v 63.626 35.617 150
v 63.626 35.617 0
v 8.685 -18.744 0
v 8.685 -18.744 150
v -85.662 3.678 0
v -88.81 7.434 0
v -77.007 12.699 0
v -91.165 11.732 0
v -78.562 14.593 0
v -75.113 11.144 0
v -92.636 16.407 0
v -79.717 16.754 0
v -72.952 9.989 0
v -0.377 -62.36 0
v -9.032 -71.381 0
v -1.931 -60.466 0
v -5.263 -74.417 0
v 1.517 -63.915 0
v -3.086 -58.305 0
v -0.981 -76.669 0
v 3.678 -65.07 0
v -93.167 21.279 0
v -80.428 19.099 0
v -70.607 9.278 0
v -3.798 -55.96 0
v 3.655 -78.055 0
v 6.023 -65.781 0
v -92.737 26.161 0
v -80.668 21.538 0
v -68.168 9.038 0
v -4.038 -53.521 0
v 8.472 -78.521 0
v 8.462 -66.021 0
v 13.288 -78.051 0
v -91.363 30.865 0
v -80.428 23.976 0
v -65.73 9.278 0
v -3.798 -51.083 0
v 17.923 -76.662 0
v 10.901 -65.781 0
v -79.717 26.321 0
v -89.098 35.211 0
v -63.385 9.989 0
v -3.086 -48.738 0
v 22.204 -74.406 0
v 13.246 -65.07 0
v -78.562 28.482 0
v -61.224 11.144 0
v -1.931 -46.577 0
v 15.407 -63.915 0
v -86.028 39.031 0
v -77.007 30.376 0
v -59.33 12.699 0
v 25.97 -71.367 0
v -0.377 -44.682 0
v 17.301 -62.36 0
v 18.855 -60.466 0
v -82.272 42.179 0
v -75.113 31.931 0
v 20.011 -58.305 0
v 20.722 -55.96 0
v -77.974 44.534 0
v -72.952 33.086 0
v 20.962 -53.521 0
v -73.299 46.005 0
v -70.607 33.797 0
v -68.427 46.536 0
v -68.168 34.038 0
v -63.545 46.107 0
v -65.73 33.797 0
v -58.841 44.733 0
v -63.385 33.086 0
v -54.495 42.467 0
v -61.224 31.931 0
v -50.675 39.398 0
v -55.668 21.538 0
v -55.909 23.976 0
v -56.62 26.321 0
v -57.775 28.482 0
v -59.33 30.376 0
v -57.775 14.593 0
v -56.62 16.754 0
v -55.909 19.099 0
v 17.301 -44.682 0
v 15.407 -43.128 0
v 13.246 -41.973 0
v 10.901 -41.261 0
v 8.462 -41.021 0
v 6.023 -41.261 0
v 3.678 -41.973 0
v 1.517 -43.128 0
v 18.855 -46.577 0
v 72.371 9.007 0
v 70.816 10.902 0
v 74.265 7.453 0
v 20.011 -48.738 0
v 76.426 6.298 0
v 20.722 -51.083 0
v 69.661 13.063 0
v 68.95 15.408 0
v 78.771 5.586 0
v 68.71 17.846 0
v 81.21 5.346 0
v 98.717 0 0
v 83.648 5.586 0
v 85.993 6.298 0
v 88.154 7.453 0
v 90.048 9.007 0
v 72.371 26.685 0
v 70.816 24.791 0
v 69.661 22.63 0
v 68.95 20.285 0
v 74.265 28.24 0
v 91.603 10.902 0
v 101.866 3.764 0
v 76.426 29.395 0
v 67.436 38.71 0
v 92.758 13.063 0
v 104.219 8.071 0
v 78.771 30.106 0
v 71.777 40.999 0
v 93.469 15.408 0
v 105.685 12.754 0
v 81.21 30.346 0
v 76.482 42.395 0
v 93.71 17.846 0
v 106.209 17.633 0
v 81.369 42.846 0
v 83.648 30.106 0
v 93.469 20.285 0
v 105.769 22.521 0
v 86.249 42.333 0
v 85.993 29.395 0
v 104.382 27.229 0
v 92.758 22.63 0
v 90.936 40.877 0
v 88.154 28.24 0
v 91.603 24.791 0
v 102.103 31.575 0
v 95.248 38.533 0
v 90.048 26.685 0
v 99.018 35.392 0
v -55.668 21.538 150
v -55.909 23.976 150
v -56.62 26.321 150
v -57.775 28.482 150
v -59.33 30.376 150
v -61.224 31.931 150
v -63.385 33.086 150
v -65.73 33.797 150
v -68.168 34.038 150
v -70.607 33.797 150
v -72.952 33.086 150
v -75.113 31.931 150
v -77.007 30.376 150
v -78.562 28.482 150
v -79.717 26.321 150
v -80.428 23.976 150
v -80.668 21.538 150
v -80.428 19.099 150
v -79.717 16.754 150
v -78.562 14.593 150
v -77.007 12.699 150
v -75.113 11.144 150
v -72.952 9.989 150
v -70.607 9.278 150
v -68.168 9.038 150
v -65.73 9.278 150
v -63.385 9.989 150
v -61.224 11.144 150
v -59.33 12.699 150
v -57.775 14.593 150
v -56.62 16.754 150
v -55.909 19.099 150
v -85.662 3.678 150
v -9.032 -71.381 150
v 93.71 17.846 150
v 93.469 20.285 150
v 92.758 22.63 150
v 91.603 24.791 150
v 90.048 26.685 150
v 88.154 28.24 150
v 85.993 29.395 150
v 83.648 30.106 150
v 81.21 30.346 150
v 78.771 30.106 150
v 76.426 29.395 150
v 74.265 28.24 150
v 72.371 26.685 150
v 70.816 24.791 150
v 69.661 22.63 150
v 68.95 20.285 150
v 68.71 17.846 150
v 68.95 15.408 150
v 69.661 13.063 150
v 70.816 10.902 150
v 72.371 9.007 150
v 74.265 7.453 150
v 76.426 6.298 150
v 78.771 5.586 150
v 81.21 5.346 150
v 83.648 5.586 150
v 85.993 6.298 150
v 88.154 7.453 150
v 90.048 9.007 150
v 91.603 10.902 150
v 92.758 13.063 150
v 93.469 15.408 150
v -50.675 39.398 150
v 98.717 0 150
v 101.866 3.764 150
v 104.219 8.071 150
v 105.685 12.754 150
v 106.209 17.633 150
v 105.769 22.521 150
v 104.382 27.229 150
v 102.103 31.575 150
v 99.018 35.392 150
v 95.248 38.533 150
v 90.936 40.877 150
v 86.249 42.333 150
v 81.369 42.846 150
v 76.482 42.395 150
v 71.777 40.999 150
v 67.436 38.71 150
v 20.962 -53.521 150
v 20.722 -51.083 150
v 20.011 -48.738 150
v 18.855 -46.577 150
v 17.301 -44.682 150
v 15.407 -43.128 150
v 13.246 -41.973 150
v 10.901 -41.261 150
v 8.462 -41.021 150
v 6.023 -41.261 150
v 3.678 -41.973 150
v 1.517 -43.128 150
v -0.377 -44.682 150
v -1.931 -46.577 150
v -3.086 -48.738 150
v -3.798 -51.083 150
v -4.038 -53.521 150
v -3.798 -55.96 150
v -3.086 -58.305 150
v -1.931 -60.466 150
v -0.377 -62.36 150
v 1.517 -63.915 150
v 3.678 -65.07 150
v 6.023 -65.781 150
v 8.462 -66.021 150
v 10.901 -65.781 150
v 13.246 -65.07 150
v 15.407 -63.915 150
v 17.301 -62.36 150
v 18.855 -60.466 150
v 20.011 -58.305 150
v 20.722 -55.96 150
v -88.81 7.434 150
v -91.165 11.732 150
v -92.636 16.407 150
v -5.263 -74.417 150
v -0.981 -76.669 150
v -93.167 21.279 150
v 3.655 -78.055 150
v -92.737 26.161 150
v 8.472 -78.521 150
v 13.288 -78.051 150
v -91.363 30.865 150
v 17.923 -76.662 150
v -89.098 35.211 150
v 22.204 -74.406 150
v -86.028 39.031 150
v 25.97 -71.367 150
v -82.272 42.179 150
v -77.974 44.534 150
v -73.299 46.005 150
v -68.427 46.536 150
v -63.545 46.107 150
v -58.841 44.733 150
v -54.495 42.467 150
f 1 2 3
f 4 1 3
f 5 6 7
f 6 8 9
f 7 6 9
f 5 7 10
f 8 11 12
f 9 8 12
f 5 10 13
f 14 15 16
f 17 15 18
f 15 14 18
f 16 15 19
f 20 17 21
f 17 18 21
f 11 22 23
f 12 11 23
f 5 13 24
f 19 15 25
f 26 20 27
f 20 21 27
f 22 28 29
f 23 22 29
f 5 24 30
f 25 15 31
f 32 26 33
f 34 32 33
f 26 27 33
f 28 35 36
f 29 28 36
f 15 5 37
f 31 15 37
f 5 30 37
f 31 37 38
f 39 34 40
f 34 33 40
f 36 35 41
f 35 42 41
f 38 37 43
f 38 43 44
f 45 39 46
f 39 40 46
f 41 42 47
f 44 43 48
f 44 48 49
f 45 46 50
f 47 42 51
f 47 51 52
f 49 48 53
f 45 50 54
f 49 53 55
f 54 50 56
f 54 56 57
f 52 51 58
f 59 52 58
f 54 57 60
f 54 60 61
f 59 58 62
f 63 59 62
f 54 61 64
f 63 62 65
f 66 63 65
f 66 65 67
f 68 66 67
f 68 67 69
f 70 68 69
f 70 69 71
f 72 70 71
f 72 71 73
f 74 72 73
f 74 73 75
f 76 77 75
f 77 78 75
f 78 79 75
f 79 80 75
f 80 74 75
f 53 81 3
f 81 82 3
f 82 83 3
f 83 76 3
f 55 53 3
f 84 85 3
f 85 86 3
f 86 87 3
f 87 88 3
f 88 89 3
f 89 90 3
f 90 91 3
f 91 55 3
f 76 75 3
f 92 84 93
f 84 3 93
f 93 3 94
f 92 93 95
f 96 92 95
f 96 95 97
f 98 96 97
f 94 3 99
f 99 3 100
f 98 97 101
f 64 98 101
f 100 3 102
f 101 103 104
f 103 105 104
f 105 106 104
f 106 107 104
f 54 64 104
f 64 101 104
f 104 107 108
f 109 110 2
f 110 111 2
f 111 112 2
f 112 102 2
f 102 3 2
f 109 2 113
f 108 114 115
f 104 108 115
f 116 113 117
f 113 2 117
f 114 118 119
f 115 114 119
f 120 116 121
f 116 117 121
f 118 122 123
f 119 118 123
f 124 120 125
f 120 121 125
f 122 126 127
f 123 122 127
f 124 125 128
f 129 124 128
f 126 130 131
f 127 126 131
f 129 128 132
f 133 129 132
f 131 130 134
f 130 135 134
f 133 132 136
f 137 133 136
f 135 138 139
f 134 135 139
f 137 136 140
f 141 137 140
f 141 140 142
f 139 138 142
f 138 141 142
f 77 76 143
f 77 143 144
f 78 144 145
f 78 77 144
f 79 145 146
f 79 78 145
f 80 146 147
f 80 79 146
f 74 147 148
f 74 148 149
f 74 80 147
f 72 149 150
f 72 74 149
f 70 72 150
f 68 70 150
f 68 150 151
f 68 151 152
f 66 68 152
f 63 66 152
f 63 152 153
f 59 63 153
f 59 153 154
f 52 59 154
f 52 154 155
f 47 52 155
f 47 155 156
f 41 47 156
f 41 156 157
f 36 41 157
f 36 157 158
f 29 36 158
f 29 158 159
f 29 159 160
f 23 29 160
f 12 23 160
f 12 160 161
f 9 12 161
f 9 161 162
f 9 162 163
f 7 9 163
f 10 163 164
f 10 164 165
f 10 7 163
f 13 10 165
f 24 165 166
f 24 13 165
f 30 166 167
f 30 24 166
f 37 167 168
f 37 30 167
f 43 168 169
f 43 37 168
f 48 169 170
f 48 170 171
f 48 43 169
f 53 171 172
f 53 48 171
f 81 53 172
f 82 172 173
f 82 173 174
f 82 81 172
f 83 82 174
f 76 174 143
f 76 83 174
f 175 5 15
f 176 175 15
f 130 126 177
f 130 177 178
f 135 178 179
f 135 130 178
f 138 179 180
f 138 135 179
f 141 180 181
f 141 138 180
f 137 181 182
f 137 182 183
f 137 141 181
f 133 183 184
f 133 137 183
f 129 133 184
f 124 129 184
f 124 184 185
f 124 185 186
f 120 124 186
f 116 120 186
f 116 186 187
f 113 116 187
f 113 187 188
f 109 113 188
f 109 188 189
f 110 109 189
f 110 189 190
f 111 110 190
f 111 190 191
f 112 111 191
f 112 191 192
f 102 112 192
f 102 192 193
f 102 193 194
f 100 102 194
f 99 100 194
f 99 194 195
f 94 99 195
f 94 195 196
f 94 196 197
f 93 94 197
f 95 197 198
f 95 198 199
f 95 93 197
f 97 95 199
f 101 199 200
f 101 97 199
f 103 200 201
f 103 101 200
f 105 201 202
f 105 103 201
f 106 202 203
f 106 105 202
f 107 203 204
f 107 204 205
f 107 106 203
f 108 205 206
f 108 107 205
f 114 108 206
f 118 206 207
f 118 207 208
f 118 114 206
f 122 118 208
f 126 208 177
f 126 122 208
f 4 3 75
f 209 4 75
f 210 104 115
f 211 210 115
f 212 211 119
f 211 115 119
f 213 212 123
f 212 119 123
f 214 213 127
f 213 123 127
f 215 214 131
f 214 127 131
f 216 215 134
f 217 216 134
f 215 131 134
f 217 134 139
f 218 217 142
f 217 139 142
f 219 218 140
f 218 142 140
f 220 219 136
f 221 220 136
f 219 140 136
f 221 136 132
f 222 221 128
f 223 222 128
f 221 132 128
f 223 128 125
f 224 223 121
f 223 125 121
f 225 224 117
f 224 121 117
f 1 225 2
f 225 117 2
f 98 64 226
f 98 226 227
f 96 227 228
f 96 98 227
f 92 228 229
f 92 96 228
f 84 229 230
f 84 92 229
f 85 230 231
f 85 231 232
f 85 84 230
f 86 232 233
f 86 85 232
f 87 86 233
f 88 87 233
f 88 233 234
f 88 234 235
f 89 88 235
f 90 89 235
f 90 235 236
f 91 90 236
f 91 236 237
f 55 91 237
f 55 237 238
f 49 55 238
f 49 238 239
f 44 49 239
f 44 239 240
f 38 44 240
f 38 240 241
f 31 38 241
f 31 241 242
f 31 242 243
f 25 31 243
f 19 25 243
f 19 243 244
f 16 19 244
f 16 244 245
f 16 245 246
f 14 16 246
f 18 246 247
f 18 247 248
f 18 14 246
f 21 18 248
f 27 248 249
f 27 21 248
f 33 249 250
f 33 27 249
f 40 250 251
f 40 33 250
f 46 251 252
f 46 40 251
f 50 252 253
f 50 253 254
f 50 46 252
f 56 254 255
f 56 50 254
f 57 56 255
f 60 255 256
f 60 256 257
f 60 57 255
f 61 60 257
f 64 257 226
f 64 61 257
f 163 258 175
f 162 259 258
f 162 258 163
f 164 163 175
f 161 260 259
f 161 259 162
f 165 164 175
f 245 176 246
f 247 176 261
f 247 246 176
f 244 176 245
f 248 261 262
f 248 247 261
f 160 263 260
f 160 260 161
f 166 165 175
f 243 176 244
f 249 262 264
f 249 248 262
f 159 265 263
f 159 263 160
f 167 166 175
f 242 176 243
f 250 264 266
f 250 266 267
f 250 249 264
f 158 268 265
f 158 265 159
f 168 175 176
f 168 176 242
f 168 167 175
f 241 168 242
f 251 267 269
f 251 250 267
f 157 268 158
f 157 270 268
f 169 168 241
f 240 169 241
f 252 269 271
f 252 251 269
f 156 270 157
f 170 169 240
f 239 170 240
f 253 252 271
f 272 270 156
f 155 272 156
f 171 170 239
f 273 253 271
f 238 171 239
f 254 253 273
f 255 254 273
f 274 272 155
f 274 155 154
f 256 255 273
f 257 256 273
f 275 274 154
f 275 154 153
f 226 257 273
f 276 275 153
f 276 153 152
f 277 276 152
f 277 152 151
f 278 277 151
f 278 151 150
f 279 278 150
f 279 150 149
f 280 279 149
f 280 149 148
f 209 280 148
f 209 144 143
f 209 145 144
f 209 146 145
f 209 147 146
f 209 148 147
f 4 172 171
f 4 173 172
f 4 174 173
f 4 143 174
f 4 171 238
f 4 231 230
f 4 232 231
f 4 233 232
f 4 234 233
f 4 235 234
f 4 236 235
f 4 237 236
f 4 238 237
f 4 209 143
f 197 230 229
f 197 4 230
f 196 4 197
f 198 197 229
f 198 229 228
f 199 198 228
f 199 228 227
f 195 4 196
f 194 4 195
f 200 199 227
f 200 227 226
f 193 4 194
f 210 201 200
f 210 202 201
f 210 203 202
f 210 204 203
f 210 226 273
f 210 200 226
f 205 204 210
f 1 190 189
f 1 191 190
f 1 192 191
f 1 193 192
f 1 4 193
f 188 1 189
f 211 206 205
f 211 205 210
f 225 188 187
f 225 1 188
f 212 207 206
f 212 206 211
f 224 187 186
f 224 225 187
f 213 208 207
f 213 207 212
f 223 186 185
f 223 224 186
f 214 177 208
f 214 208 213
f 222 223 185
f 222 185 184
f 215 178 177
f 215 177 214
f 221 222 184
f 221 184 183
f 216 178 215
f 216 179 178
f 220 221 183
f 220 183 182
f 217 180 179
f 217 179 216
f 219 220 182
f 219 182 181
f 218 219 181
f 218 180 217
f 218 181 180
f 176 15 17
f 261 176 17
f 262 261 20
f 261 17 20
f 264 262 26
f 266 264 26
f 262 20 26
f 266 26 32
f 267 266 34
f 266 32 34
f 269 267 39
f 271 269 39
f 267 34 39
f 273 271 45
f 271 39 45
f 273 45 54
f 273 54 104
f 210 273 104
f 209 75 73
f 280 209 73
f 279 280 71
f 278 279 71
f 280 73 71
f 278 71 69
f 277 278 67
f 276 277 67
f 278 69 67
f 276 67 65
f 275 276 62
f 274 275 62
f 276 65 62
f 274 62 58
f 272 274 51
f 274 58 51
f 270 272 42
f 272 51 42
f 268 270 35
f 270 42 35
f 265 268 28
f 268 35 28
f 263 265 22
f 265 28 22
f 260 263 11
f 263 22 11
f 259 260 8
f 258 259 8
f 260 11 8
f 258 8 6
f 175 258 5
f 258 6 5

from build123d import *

# Parameters (mm, degrees)
F0_R     = 12.5
F1_DEPTH = 150
F3_DEPTH = 50


# Not quite as in the source:
# - the program builds the solid bodies; features that only make, move or delete a surface that nothing else refers to are left out


with BuildPart() as f1:
    # F0 (on Top) → F1 (new body)
    with BuildSketch(Plane.XY):
        with BuildLine():
            Line((8.6845052377, -18.7444362128), (-50.6748429861, 39.3975202147))
            ThreePointArc((-50.6748429861, 39.3975202147), (-86.0282846169, 39.0312350068), (-85.661999409, 3.6777933759))
            Line((-85.661999409, 3.6777933759), (-9.0315715293, -71.3810327757))
            ThreePointArc((-9.0315715293, -71.3810327757), (8.4718011348, -78.5211674377), (25.9695737293, -71.3673200922))
            Line((25.9695737293, -71.3673200922), (98.7170861934, 0))
            ThreePointArc((98.7170861934, 0), (99.0182133881, 35.3918171352), (63.6258335307, 35.6173071466))
            Line((63.6258335307, 35.6173071466), (8.6845052377, -18.7444362128))
        make_face()
        with Locations((8.4620066821, -53.5211693563)):
            Circle(F0_R, mode=Mode.SUBTRACT)
        with Locations((-68.1684211975, 21.5376567953)):
            Circle(F0_R, mode=Mode.SUBTRACT)
        with Locations((81.2095191462, 17.8461507359)):
            Circle(F0_R, mode=Mode.SUBTRACT)
    extrude(amount=F1_DEPTH)

    # F0 (on Top) → F3 (join)
    with BuildSketch(Plane.XY):
        with BuildLine():
            Line((8.6845052377, -18.7444362128), (-50.6748429861, 39.3975202147))
            ThreePointArc((-50.6748429861, 39.3975202147), (-86.0282846169, 39.0312350068), (-85.661999409, 3.6777933759))
            Line((-85.661999409, 3.6777933759), (-9.0315715293, -71.3810327757))
            ThreePointArc((-9.0315715293, -71.3810327757), (8.4718011348, -78.5211674377), (25.9695737293, -71.3673200922))
            Line((25.9695737293, -71.3673200922), (98.7170861934, 0))
            ThreePointArc((98.7170861934, 0), (99.0182133881, 35.3918171352), (63.6258335307, 35.6173071466))
            Line((63.6258335307, 35.6173071466), (8.6845052377, -18.7444362128))
        make_face()
        with Locations((8.4620066821, -53.5211693563)):
            Circle(F0_R, mode=Mode.SUBTRACT)
        with Locations((-68.1684211975, 21.5376567953)):
            Circle(F0_R, mode=Mode.SUBTRACT)
        with Locations((81.2095191462, 17.8461507359)):
            Circle(F0_R, mode=Mode.SUBTRACT)
    extrude(amount=F3_DEPTH)


solid = f1.part
